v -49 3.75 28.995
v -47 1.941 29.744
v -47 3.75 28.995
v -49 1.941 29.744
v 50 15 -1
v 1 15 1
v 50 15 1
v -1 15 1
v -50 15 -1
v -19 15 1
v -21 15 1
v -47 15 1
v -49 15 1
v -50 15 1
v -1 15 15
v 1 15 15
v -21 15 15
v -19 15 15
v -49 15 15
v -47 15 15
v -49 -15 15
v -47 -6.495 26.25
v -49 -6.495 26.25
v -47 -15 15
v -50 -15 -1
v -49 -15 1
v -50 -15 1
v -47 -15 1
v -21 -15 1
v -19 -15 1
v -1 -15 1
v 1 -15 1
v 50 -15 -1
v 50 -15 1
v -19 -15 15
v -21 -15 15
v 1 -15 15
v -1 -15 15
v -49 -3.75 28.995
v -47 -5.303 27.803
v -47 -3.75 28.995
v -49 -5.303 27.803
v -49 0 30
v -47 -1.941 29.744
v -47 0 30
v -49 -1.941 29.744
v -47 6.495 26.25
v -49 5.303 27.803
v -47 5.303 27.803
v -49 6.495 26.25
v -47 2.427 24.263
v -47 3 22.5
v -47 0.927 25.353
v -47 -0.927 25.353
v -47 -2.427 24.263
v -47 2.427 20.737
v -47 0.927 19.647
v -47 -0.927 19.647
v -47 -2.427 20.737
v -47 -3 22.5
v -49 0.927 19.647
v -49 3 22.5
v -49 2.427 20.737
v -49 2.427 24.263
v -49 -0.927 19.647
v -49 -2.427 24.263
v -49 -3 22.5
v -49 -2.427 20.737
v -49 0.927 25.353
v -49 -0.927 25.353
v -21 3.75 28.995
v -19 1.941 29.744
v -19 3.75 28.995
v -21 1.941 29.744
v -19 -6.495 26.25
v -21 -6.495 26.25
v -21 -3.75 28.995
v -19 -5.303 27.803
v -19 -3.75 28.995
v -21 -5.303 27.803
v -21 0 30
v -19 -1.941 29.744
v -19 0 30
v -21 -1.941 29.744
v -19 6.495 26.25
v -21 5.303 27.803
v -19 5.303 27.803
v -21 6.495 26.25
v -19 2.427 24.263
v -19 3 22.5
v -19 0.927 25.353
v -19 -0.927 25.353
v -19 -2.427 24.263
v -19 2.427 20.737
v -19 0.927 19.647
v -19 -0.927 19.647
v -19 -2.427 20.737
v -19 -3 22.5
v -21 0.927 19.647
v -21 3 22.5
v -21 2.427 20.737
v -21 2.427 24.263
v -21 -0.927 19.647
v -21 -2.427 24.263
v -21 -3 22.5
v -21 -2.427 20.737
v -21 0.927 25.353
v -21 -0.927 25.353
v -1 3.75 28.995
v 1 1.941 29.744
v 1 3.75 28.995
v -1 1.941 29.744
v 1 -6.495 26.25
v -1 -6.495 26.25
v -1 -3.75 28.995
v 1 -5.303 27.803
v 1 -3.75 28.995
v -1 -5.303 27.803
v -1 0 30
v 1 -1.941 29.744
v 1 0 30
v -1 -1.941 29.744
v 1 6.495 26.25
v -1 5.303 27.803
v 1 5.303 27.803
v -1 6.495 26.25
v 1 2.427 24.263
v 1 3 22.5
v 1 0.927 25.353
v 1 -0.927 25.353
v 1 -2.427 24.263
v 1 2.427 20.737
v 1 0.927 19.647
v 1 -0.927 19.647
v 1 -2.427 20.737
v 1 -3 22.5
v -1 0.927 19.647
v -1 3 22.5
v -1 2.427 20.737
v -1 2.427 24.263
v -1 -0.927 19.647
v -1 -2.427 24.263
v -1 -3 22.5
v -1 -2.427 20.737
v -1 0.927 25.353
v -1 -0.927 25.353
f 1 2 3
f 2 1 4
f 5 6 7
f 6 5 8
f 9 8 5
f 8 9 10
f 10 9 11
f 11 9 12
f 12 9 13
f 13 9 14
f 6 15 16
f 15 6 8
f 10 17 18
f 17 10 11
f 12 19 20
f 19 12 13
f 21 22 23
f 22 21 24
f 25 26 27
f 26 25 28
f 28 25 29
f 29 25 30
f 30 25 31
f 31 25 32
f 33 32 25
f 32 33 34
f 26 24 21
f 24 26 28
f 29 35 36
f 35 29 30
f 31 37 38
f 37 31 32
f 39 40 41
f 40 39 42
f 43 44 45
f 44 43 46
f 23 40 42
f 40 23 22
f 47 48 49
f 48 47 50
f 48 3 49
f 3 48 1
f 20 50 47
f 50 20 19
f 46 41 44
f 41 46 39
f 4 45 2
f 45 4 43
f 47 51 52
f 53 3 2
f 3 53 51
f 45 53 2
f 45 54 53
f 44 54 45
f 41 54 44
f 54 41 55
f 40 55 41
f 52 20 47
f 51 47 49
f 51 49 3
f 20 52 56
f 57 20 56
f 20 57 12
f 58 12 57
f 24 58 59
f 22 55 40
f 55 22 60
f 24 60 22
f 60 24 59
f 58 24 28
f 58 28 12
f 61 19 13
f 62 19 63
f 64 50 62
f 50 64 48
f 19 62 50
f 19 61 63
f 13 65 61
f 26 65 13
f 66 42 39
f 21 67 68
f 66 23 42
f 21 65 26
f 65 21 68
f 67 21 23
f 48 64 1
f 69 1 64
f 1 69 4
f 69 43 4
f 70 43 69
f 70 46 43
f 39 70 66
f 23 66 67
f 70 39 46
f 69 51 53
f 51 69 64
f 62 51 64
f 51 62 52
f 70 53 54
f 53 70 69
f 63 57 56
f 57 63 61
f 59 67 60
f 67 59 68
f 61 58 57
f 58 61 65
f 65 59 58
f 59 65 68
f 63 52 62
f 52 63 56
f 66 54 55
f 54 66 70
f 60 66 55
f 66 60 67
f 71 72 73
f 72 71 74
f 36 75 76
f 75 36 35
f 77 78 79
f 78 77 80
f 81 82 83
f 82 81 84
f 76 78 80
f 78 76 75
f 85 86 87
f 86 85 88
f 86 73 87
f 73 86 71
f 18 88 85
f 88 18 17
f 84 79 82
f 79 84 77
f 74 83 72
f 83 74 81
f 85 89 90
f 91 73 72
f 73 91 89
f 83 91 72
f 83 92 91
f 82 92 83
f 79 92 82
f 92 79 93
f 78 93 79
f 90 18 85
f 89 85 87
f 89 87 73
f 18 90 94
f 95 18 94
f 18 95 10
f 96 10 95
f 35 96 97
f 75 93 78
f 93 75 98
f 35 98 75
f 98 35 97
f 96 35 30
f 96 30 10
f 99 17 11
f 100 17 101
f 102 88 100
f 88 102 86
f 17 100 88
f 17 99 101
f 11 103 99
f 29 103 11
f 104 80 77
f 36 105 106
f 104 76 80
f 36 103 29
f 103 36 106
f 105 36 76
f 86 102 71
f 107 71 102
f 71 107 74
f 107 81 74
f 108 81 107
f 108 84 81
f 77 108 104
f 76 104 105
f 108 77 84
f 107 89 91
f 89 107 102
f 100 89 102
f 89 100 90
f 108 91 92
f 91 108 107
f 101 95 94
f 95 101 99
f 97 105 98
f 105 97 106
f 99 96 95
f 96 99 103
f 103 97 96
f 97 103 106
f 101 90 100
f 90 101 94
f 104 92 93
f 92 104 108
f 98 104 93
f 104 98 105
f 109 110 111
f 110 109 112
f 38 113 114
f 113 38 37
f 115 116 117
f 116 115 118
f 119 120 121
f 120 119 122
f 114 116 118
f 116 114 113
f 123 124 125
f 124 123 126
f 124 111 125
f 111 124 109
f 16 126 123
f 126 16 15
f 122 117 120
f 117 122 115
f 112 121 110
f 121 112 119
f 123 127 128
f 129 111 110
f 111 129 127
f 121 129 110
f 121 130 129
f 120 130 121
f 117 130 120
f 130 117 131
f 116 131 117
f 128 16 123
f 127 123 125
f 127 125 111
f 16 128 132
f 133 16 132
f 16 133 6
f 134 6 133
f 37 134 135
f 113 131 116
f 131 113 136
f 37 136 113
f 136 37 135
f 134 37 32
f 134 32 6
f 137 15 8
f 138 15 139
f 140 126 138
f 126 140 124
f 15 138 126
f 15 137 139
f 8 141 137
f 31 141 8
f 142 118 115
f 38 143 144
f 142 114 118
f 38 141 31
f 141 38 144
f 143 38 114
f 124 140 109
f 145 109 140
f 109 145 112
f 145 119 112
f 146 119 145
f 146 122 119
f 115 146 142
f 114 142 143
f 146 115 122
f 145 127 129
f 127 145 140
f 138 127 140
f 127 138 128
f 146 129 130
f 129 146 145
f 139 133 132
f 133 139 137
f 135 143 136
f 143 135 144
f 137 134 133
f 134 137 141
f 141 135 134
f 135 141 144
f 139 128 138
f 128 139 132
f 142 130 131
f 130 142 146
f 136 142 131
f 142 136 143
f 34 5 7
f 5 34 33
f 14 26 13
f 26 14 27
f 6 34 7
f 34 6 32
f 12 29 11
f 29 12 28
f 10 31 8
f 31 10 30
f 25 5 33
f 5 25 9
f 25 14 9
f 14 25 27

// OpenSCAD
/*
difference(){
color("red")cylinder(50, 100, 10, center=true);
cylinder(200,10,10,center=true);
}
//difference(){
%translate([0,0,-50])cylinder(50,100,100,center=true);

//}
color("green")translate([-2,100,-75])cube([10,2,20]);
//cube([100,])
*/

module holder(width, height, depth, hole_r)
{
	difference(){
	hull(){
	cube([width, depth, height/2], center=true);

	translate([0,0,height/2])rotate([90,0,0])cylinder(depth, height/4, height/4, center=true);

	}
	translate([0,0,height/2])rotate([90,0,0])cylinder(depth+2,hole_r,hole_r,center=true);
	}
}

// settings
holder_height = 30;
holder_depth = 2;
holder_hole = 3;
bottom_length = 100;

// bottom
cube([100, 30,2], center=true);
// holder 1
translate([(-bottom_length/2)+holder_depth,0,holder_height/4])
	rotate([0,0,90])
	holder(30, holder_height, holder_depth, holder_hole);
// holder 2
translate([-20,0,holder_height/4])
	rotate([0,0,90])
	holder(30, holder_height, holder_depth, holder_hole);
// holder 3
translate([0,0,holder_height/4])
	rotate([0,0,90])
	holder(30, holder_height, holder_depth, holder_hole);
